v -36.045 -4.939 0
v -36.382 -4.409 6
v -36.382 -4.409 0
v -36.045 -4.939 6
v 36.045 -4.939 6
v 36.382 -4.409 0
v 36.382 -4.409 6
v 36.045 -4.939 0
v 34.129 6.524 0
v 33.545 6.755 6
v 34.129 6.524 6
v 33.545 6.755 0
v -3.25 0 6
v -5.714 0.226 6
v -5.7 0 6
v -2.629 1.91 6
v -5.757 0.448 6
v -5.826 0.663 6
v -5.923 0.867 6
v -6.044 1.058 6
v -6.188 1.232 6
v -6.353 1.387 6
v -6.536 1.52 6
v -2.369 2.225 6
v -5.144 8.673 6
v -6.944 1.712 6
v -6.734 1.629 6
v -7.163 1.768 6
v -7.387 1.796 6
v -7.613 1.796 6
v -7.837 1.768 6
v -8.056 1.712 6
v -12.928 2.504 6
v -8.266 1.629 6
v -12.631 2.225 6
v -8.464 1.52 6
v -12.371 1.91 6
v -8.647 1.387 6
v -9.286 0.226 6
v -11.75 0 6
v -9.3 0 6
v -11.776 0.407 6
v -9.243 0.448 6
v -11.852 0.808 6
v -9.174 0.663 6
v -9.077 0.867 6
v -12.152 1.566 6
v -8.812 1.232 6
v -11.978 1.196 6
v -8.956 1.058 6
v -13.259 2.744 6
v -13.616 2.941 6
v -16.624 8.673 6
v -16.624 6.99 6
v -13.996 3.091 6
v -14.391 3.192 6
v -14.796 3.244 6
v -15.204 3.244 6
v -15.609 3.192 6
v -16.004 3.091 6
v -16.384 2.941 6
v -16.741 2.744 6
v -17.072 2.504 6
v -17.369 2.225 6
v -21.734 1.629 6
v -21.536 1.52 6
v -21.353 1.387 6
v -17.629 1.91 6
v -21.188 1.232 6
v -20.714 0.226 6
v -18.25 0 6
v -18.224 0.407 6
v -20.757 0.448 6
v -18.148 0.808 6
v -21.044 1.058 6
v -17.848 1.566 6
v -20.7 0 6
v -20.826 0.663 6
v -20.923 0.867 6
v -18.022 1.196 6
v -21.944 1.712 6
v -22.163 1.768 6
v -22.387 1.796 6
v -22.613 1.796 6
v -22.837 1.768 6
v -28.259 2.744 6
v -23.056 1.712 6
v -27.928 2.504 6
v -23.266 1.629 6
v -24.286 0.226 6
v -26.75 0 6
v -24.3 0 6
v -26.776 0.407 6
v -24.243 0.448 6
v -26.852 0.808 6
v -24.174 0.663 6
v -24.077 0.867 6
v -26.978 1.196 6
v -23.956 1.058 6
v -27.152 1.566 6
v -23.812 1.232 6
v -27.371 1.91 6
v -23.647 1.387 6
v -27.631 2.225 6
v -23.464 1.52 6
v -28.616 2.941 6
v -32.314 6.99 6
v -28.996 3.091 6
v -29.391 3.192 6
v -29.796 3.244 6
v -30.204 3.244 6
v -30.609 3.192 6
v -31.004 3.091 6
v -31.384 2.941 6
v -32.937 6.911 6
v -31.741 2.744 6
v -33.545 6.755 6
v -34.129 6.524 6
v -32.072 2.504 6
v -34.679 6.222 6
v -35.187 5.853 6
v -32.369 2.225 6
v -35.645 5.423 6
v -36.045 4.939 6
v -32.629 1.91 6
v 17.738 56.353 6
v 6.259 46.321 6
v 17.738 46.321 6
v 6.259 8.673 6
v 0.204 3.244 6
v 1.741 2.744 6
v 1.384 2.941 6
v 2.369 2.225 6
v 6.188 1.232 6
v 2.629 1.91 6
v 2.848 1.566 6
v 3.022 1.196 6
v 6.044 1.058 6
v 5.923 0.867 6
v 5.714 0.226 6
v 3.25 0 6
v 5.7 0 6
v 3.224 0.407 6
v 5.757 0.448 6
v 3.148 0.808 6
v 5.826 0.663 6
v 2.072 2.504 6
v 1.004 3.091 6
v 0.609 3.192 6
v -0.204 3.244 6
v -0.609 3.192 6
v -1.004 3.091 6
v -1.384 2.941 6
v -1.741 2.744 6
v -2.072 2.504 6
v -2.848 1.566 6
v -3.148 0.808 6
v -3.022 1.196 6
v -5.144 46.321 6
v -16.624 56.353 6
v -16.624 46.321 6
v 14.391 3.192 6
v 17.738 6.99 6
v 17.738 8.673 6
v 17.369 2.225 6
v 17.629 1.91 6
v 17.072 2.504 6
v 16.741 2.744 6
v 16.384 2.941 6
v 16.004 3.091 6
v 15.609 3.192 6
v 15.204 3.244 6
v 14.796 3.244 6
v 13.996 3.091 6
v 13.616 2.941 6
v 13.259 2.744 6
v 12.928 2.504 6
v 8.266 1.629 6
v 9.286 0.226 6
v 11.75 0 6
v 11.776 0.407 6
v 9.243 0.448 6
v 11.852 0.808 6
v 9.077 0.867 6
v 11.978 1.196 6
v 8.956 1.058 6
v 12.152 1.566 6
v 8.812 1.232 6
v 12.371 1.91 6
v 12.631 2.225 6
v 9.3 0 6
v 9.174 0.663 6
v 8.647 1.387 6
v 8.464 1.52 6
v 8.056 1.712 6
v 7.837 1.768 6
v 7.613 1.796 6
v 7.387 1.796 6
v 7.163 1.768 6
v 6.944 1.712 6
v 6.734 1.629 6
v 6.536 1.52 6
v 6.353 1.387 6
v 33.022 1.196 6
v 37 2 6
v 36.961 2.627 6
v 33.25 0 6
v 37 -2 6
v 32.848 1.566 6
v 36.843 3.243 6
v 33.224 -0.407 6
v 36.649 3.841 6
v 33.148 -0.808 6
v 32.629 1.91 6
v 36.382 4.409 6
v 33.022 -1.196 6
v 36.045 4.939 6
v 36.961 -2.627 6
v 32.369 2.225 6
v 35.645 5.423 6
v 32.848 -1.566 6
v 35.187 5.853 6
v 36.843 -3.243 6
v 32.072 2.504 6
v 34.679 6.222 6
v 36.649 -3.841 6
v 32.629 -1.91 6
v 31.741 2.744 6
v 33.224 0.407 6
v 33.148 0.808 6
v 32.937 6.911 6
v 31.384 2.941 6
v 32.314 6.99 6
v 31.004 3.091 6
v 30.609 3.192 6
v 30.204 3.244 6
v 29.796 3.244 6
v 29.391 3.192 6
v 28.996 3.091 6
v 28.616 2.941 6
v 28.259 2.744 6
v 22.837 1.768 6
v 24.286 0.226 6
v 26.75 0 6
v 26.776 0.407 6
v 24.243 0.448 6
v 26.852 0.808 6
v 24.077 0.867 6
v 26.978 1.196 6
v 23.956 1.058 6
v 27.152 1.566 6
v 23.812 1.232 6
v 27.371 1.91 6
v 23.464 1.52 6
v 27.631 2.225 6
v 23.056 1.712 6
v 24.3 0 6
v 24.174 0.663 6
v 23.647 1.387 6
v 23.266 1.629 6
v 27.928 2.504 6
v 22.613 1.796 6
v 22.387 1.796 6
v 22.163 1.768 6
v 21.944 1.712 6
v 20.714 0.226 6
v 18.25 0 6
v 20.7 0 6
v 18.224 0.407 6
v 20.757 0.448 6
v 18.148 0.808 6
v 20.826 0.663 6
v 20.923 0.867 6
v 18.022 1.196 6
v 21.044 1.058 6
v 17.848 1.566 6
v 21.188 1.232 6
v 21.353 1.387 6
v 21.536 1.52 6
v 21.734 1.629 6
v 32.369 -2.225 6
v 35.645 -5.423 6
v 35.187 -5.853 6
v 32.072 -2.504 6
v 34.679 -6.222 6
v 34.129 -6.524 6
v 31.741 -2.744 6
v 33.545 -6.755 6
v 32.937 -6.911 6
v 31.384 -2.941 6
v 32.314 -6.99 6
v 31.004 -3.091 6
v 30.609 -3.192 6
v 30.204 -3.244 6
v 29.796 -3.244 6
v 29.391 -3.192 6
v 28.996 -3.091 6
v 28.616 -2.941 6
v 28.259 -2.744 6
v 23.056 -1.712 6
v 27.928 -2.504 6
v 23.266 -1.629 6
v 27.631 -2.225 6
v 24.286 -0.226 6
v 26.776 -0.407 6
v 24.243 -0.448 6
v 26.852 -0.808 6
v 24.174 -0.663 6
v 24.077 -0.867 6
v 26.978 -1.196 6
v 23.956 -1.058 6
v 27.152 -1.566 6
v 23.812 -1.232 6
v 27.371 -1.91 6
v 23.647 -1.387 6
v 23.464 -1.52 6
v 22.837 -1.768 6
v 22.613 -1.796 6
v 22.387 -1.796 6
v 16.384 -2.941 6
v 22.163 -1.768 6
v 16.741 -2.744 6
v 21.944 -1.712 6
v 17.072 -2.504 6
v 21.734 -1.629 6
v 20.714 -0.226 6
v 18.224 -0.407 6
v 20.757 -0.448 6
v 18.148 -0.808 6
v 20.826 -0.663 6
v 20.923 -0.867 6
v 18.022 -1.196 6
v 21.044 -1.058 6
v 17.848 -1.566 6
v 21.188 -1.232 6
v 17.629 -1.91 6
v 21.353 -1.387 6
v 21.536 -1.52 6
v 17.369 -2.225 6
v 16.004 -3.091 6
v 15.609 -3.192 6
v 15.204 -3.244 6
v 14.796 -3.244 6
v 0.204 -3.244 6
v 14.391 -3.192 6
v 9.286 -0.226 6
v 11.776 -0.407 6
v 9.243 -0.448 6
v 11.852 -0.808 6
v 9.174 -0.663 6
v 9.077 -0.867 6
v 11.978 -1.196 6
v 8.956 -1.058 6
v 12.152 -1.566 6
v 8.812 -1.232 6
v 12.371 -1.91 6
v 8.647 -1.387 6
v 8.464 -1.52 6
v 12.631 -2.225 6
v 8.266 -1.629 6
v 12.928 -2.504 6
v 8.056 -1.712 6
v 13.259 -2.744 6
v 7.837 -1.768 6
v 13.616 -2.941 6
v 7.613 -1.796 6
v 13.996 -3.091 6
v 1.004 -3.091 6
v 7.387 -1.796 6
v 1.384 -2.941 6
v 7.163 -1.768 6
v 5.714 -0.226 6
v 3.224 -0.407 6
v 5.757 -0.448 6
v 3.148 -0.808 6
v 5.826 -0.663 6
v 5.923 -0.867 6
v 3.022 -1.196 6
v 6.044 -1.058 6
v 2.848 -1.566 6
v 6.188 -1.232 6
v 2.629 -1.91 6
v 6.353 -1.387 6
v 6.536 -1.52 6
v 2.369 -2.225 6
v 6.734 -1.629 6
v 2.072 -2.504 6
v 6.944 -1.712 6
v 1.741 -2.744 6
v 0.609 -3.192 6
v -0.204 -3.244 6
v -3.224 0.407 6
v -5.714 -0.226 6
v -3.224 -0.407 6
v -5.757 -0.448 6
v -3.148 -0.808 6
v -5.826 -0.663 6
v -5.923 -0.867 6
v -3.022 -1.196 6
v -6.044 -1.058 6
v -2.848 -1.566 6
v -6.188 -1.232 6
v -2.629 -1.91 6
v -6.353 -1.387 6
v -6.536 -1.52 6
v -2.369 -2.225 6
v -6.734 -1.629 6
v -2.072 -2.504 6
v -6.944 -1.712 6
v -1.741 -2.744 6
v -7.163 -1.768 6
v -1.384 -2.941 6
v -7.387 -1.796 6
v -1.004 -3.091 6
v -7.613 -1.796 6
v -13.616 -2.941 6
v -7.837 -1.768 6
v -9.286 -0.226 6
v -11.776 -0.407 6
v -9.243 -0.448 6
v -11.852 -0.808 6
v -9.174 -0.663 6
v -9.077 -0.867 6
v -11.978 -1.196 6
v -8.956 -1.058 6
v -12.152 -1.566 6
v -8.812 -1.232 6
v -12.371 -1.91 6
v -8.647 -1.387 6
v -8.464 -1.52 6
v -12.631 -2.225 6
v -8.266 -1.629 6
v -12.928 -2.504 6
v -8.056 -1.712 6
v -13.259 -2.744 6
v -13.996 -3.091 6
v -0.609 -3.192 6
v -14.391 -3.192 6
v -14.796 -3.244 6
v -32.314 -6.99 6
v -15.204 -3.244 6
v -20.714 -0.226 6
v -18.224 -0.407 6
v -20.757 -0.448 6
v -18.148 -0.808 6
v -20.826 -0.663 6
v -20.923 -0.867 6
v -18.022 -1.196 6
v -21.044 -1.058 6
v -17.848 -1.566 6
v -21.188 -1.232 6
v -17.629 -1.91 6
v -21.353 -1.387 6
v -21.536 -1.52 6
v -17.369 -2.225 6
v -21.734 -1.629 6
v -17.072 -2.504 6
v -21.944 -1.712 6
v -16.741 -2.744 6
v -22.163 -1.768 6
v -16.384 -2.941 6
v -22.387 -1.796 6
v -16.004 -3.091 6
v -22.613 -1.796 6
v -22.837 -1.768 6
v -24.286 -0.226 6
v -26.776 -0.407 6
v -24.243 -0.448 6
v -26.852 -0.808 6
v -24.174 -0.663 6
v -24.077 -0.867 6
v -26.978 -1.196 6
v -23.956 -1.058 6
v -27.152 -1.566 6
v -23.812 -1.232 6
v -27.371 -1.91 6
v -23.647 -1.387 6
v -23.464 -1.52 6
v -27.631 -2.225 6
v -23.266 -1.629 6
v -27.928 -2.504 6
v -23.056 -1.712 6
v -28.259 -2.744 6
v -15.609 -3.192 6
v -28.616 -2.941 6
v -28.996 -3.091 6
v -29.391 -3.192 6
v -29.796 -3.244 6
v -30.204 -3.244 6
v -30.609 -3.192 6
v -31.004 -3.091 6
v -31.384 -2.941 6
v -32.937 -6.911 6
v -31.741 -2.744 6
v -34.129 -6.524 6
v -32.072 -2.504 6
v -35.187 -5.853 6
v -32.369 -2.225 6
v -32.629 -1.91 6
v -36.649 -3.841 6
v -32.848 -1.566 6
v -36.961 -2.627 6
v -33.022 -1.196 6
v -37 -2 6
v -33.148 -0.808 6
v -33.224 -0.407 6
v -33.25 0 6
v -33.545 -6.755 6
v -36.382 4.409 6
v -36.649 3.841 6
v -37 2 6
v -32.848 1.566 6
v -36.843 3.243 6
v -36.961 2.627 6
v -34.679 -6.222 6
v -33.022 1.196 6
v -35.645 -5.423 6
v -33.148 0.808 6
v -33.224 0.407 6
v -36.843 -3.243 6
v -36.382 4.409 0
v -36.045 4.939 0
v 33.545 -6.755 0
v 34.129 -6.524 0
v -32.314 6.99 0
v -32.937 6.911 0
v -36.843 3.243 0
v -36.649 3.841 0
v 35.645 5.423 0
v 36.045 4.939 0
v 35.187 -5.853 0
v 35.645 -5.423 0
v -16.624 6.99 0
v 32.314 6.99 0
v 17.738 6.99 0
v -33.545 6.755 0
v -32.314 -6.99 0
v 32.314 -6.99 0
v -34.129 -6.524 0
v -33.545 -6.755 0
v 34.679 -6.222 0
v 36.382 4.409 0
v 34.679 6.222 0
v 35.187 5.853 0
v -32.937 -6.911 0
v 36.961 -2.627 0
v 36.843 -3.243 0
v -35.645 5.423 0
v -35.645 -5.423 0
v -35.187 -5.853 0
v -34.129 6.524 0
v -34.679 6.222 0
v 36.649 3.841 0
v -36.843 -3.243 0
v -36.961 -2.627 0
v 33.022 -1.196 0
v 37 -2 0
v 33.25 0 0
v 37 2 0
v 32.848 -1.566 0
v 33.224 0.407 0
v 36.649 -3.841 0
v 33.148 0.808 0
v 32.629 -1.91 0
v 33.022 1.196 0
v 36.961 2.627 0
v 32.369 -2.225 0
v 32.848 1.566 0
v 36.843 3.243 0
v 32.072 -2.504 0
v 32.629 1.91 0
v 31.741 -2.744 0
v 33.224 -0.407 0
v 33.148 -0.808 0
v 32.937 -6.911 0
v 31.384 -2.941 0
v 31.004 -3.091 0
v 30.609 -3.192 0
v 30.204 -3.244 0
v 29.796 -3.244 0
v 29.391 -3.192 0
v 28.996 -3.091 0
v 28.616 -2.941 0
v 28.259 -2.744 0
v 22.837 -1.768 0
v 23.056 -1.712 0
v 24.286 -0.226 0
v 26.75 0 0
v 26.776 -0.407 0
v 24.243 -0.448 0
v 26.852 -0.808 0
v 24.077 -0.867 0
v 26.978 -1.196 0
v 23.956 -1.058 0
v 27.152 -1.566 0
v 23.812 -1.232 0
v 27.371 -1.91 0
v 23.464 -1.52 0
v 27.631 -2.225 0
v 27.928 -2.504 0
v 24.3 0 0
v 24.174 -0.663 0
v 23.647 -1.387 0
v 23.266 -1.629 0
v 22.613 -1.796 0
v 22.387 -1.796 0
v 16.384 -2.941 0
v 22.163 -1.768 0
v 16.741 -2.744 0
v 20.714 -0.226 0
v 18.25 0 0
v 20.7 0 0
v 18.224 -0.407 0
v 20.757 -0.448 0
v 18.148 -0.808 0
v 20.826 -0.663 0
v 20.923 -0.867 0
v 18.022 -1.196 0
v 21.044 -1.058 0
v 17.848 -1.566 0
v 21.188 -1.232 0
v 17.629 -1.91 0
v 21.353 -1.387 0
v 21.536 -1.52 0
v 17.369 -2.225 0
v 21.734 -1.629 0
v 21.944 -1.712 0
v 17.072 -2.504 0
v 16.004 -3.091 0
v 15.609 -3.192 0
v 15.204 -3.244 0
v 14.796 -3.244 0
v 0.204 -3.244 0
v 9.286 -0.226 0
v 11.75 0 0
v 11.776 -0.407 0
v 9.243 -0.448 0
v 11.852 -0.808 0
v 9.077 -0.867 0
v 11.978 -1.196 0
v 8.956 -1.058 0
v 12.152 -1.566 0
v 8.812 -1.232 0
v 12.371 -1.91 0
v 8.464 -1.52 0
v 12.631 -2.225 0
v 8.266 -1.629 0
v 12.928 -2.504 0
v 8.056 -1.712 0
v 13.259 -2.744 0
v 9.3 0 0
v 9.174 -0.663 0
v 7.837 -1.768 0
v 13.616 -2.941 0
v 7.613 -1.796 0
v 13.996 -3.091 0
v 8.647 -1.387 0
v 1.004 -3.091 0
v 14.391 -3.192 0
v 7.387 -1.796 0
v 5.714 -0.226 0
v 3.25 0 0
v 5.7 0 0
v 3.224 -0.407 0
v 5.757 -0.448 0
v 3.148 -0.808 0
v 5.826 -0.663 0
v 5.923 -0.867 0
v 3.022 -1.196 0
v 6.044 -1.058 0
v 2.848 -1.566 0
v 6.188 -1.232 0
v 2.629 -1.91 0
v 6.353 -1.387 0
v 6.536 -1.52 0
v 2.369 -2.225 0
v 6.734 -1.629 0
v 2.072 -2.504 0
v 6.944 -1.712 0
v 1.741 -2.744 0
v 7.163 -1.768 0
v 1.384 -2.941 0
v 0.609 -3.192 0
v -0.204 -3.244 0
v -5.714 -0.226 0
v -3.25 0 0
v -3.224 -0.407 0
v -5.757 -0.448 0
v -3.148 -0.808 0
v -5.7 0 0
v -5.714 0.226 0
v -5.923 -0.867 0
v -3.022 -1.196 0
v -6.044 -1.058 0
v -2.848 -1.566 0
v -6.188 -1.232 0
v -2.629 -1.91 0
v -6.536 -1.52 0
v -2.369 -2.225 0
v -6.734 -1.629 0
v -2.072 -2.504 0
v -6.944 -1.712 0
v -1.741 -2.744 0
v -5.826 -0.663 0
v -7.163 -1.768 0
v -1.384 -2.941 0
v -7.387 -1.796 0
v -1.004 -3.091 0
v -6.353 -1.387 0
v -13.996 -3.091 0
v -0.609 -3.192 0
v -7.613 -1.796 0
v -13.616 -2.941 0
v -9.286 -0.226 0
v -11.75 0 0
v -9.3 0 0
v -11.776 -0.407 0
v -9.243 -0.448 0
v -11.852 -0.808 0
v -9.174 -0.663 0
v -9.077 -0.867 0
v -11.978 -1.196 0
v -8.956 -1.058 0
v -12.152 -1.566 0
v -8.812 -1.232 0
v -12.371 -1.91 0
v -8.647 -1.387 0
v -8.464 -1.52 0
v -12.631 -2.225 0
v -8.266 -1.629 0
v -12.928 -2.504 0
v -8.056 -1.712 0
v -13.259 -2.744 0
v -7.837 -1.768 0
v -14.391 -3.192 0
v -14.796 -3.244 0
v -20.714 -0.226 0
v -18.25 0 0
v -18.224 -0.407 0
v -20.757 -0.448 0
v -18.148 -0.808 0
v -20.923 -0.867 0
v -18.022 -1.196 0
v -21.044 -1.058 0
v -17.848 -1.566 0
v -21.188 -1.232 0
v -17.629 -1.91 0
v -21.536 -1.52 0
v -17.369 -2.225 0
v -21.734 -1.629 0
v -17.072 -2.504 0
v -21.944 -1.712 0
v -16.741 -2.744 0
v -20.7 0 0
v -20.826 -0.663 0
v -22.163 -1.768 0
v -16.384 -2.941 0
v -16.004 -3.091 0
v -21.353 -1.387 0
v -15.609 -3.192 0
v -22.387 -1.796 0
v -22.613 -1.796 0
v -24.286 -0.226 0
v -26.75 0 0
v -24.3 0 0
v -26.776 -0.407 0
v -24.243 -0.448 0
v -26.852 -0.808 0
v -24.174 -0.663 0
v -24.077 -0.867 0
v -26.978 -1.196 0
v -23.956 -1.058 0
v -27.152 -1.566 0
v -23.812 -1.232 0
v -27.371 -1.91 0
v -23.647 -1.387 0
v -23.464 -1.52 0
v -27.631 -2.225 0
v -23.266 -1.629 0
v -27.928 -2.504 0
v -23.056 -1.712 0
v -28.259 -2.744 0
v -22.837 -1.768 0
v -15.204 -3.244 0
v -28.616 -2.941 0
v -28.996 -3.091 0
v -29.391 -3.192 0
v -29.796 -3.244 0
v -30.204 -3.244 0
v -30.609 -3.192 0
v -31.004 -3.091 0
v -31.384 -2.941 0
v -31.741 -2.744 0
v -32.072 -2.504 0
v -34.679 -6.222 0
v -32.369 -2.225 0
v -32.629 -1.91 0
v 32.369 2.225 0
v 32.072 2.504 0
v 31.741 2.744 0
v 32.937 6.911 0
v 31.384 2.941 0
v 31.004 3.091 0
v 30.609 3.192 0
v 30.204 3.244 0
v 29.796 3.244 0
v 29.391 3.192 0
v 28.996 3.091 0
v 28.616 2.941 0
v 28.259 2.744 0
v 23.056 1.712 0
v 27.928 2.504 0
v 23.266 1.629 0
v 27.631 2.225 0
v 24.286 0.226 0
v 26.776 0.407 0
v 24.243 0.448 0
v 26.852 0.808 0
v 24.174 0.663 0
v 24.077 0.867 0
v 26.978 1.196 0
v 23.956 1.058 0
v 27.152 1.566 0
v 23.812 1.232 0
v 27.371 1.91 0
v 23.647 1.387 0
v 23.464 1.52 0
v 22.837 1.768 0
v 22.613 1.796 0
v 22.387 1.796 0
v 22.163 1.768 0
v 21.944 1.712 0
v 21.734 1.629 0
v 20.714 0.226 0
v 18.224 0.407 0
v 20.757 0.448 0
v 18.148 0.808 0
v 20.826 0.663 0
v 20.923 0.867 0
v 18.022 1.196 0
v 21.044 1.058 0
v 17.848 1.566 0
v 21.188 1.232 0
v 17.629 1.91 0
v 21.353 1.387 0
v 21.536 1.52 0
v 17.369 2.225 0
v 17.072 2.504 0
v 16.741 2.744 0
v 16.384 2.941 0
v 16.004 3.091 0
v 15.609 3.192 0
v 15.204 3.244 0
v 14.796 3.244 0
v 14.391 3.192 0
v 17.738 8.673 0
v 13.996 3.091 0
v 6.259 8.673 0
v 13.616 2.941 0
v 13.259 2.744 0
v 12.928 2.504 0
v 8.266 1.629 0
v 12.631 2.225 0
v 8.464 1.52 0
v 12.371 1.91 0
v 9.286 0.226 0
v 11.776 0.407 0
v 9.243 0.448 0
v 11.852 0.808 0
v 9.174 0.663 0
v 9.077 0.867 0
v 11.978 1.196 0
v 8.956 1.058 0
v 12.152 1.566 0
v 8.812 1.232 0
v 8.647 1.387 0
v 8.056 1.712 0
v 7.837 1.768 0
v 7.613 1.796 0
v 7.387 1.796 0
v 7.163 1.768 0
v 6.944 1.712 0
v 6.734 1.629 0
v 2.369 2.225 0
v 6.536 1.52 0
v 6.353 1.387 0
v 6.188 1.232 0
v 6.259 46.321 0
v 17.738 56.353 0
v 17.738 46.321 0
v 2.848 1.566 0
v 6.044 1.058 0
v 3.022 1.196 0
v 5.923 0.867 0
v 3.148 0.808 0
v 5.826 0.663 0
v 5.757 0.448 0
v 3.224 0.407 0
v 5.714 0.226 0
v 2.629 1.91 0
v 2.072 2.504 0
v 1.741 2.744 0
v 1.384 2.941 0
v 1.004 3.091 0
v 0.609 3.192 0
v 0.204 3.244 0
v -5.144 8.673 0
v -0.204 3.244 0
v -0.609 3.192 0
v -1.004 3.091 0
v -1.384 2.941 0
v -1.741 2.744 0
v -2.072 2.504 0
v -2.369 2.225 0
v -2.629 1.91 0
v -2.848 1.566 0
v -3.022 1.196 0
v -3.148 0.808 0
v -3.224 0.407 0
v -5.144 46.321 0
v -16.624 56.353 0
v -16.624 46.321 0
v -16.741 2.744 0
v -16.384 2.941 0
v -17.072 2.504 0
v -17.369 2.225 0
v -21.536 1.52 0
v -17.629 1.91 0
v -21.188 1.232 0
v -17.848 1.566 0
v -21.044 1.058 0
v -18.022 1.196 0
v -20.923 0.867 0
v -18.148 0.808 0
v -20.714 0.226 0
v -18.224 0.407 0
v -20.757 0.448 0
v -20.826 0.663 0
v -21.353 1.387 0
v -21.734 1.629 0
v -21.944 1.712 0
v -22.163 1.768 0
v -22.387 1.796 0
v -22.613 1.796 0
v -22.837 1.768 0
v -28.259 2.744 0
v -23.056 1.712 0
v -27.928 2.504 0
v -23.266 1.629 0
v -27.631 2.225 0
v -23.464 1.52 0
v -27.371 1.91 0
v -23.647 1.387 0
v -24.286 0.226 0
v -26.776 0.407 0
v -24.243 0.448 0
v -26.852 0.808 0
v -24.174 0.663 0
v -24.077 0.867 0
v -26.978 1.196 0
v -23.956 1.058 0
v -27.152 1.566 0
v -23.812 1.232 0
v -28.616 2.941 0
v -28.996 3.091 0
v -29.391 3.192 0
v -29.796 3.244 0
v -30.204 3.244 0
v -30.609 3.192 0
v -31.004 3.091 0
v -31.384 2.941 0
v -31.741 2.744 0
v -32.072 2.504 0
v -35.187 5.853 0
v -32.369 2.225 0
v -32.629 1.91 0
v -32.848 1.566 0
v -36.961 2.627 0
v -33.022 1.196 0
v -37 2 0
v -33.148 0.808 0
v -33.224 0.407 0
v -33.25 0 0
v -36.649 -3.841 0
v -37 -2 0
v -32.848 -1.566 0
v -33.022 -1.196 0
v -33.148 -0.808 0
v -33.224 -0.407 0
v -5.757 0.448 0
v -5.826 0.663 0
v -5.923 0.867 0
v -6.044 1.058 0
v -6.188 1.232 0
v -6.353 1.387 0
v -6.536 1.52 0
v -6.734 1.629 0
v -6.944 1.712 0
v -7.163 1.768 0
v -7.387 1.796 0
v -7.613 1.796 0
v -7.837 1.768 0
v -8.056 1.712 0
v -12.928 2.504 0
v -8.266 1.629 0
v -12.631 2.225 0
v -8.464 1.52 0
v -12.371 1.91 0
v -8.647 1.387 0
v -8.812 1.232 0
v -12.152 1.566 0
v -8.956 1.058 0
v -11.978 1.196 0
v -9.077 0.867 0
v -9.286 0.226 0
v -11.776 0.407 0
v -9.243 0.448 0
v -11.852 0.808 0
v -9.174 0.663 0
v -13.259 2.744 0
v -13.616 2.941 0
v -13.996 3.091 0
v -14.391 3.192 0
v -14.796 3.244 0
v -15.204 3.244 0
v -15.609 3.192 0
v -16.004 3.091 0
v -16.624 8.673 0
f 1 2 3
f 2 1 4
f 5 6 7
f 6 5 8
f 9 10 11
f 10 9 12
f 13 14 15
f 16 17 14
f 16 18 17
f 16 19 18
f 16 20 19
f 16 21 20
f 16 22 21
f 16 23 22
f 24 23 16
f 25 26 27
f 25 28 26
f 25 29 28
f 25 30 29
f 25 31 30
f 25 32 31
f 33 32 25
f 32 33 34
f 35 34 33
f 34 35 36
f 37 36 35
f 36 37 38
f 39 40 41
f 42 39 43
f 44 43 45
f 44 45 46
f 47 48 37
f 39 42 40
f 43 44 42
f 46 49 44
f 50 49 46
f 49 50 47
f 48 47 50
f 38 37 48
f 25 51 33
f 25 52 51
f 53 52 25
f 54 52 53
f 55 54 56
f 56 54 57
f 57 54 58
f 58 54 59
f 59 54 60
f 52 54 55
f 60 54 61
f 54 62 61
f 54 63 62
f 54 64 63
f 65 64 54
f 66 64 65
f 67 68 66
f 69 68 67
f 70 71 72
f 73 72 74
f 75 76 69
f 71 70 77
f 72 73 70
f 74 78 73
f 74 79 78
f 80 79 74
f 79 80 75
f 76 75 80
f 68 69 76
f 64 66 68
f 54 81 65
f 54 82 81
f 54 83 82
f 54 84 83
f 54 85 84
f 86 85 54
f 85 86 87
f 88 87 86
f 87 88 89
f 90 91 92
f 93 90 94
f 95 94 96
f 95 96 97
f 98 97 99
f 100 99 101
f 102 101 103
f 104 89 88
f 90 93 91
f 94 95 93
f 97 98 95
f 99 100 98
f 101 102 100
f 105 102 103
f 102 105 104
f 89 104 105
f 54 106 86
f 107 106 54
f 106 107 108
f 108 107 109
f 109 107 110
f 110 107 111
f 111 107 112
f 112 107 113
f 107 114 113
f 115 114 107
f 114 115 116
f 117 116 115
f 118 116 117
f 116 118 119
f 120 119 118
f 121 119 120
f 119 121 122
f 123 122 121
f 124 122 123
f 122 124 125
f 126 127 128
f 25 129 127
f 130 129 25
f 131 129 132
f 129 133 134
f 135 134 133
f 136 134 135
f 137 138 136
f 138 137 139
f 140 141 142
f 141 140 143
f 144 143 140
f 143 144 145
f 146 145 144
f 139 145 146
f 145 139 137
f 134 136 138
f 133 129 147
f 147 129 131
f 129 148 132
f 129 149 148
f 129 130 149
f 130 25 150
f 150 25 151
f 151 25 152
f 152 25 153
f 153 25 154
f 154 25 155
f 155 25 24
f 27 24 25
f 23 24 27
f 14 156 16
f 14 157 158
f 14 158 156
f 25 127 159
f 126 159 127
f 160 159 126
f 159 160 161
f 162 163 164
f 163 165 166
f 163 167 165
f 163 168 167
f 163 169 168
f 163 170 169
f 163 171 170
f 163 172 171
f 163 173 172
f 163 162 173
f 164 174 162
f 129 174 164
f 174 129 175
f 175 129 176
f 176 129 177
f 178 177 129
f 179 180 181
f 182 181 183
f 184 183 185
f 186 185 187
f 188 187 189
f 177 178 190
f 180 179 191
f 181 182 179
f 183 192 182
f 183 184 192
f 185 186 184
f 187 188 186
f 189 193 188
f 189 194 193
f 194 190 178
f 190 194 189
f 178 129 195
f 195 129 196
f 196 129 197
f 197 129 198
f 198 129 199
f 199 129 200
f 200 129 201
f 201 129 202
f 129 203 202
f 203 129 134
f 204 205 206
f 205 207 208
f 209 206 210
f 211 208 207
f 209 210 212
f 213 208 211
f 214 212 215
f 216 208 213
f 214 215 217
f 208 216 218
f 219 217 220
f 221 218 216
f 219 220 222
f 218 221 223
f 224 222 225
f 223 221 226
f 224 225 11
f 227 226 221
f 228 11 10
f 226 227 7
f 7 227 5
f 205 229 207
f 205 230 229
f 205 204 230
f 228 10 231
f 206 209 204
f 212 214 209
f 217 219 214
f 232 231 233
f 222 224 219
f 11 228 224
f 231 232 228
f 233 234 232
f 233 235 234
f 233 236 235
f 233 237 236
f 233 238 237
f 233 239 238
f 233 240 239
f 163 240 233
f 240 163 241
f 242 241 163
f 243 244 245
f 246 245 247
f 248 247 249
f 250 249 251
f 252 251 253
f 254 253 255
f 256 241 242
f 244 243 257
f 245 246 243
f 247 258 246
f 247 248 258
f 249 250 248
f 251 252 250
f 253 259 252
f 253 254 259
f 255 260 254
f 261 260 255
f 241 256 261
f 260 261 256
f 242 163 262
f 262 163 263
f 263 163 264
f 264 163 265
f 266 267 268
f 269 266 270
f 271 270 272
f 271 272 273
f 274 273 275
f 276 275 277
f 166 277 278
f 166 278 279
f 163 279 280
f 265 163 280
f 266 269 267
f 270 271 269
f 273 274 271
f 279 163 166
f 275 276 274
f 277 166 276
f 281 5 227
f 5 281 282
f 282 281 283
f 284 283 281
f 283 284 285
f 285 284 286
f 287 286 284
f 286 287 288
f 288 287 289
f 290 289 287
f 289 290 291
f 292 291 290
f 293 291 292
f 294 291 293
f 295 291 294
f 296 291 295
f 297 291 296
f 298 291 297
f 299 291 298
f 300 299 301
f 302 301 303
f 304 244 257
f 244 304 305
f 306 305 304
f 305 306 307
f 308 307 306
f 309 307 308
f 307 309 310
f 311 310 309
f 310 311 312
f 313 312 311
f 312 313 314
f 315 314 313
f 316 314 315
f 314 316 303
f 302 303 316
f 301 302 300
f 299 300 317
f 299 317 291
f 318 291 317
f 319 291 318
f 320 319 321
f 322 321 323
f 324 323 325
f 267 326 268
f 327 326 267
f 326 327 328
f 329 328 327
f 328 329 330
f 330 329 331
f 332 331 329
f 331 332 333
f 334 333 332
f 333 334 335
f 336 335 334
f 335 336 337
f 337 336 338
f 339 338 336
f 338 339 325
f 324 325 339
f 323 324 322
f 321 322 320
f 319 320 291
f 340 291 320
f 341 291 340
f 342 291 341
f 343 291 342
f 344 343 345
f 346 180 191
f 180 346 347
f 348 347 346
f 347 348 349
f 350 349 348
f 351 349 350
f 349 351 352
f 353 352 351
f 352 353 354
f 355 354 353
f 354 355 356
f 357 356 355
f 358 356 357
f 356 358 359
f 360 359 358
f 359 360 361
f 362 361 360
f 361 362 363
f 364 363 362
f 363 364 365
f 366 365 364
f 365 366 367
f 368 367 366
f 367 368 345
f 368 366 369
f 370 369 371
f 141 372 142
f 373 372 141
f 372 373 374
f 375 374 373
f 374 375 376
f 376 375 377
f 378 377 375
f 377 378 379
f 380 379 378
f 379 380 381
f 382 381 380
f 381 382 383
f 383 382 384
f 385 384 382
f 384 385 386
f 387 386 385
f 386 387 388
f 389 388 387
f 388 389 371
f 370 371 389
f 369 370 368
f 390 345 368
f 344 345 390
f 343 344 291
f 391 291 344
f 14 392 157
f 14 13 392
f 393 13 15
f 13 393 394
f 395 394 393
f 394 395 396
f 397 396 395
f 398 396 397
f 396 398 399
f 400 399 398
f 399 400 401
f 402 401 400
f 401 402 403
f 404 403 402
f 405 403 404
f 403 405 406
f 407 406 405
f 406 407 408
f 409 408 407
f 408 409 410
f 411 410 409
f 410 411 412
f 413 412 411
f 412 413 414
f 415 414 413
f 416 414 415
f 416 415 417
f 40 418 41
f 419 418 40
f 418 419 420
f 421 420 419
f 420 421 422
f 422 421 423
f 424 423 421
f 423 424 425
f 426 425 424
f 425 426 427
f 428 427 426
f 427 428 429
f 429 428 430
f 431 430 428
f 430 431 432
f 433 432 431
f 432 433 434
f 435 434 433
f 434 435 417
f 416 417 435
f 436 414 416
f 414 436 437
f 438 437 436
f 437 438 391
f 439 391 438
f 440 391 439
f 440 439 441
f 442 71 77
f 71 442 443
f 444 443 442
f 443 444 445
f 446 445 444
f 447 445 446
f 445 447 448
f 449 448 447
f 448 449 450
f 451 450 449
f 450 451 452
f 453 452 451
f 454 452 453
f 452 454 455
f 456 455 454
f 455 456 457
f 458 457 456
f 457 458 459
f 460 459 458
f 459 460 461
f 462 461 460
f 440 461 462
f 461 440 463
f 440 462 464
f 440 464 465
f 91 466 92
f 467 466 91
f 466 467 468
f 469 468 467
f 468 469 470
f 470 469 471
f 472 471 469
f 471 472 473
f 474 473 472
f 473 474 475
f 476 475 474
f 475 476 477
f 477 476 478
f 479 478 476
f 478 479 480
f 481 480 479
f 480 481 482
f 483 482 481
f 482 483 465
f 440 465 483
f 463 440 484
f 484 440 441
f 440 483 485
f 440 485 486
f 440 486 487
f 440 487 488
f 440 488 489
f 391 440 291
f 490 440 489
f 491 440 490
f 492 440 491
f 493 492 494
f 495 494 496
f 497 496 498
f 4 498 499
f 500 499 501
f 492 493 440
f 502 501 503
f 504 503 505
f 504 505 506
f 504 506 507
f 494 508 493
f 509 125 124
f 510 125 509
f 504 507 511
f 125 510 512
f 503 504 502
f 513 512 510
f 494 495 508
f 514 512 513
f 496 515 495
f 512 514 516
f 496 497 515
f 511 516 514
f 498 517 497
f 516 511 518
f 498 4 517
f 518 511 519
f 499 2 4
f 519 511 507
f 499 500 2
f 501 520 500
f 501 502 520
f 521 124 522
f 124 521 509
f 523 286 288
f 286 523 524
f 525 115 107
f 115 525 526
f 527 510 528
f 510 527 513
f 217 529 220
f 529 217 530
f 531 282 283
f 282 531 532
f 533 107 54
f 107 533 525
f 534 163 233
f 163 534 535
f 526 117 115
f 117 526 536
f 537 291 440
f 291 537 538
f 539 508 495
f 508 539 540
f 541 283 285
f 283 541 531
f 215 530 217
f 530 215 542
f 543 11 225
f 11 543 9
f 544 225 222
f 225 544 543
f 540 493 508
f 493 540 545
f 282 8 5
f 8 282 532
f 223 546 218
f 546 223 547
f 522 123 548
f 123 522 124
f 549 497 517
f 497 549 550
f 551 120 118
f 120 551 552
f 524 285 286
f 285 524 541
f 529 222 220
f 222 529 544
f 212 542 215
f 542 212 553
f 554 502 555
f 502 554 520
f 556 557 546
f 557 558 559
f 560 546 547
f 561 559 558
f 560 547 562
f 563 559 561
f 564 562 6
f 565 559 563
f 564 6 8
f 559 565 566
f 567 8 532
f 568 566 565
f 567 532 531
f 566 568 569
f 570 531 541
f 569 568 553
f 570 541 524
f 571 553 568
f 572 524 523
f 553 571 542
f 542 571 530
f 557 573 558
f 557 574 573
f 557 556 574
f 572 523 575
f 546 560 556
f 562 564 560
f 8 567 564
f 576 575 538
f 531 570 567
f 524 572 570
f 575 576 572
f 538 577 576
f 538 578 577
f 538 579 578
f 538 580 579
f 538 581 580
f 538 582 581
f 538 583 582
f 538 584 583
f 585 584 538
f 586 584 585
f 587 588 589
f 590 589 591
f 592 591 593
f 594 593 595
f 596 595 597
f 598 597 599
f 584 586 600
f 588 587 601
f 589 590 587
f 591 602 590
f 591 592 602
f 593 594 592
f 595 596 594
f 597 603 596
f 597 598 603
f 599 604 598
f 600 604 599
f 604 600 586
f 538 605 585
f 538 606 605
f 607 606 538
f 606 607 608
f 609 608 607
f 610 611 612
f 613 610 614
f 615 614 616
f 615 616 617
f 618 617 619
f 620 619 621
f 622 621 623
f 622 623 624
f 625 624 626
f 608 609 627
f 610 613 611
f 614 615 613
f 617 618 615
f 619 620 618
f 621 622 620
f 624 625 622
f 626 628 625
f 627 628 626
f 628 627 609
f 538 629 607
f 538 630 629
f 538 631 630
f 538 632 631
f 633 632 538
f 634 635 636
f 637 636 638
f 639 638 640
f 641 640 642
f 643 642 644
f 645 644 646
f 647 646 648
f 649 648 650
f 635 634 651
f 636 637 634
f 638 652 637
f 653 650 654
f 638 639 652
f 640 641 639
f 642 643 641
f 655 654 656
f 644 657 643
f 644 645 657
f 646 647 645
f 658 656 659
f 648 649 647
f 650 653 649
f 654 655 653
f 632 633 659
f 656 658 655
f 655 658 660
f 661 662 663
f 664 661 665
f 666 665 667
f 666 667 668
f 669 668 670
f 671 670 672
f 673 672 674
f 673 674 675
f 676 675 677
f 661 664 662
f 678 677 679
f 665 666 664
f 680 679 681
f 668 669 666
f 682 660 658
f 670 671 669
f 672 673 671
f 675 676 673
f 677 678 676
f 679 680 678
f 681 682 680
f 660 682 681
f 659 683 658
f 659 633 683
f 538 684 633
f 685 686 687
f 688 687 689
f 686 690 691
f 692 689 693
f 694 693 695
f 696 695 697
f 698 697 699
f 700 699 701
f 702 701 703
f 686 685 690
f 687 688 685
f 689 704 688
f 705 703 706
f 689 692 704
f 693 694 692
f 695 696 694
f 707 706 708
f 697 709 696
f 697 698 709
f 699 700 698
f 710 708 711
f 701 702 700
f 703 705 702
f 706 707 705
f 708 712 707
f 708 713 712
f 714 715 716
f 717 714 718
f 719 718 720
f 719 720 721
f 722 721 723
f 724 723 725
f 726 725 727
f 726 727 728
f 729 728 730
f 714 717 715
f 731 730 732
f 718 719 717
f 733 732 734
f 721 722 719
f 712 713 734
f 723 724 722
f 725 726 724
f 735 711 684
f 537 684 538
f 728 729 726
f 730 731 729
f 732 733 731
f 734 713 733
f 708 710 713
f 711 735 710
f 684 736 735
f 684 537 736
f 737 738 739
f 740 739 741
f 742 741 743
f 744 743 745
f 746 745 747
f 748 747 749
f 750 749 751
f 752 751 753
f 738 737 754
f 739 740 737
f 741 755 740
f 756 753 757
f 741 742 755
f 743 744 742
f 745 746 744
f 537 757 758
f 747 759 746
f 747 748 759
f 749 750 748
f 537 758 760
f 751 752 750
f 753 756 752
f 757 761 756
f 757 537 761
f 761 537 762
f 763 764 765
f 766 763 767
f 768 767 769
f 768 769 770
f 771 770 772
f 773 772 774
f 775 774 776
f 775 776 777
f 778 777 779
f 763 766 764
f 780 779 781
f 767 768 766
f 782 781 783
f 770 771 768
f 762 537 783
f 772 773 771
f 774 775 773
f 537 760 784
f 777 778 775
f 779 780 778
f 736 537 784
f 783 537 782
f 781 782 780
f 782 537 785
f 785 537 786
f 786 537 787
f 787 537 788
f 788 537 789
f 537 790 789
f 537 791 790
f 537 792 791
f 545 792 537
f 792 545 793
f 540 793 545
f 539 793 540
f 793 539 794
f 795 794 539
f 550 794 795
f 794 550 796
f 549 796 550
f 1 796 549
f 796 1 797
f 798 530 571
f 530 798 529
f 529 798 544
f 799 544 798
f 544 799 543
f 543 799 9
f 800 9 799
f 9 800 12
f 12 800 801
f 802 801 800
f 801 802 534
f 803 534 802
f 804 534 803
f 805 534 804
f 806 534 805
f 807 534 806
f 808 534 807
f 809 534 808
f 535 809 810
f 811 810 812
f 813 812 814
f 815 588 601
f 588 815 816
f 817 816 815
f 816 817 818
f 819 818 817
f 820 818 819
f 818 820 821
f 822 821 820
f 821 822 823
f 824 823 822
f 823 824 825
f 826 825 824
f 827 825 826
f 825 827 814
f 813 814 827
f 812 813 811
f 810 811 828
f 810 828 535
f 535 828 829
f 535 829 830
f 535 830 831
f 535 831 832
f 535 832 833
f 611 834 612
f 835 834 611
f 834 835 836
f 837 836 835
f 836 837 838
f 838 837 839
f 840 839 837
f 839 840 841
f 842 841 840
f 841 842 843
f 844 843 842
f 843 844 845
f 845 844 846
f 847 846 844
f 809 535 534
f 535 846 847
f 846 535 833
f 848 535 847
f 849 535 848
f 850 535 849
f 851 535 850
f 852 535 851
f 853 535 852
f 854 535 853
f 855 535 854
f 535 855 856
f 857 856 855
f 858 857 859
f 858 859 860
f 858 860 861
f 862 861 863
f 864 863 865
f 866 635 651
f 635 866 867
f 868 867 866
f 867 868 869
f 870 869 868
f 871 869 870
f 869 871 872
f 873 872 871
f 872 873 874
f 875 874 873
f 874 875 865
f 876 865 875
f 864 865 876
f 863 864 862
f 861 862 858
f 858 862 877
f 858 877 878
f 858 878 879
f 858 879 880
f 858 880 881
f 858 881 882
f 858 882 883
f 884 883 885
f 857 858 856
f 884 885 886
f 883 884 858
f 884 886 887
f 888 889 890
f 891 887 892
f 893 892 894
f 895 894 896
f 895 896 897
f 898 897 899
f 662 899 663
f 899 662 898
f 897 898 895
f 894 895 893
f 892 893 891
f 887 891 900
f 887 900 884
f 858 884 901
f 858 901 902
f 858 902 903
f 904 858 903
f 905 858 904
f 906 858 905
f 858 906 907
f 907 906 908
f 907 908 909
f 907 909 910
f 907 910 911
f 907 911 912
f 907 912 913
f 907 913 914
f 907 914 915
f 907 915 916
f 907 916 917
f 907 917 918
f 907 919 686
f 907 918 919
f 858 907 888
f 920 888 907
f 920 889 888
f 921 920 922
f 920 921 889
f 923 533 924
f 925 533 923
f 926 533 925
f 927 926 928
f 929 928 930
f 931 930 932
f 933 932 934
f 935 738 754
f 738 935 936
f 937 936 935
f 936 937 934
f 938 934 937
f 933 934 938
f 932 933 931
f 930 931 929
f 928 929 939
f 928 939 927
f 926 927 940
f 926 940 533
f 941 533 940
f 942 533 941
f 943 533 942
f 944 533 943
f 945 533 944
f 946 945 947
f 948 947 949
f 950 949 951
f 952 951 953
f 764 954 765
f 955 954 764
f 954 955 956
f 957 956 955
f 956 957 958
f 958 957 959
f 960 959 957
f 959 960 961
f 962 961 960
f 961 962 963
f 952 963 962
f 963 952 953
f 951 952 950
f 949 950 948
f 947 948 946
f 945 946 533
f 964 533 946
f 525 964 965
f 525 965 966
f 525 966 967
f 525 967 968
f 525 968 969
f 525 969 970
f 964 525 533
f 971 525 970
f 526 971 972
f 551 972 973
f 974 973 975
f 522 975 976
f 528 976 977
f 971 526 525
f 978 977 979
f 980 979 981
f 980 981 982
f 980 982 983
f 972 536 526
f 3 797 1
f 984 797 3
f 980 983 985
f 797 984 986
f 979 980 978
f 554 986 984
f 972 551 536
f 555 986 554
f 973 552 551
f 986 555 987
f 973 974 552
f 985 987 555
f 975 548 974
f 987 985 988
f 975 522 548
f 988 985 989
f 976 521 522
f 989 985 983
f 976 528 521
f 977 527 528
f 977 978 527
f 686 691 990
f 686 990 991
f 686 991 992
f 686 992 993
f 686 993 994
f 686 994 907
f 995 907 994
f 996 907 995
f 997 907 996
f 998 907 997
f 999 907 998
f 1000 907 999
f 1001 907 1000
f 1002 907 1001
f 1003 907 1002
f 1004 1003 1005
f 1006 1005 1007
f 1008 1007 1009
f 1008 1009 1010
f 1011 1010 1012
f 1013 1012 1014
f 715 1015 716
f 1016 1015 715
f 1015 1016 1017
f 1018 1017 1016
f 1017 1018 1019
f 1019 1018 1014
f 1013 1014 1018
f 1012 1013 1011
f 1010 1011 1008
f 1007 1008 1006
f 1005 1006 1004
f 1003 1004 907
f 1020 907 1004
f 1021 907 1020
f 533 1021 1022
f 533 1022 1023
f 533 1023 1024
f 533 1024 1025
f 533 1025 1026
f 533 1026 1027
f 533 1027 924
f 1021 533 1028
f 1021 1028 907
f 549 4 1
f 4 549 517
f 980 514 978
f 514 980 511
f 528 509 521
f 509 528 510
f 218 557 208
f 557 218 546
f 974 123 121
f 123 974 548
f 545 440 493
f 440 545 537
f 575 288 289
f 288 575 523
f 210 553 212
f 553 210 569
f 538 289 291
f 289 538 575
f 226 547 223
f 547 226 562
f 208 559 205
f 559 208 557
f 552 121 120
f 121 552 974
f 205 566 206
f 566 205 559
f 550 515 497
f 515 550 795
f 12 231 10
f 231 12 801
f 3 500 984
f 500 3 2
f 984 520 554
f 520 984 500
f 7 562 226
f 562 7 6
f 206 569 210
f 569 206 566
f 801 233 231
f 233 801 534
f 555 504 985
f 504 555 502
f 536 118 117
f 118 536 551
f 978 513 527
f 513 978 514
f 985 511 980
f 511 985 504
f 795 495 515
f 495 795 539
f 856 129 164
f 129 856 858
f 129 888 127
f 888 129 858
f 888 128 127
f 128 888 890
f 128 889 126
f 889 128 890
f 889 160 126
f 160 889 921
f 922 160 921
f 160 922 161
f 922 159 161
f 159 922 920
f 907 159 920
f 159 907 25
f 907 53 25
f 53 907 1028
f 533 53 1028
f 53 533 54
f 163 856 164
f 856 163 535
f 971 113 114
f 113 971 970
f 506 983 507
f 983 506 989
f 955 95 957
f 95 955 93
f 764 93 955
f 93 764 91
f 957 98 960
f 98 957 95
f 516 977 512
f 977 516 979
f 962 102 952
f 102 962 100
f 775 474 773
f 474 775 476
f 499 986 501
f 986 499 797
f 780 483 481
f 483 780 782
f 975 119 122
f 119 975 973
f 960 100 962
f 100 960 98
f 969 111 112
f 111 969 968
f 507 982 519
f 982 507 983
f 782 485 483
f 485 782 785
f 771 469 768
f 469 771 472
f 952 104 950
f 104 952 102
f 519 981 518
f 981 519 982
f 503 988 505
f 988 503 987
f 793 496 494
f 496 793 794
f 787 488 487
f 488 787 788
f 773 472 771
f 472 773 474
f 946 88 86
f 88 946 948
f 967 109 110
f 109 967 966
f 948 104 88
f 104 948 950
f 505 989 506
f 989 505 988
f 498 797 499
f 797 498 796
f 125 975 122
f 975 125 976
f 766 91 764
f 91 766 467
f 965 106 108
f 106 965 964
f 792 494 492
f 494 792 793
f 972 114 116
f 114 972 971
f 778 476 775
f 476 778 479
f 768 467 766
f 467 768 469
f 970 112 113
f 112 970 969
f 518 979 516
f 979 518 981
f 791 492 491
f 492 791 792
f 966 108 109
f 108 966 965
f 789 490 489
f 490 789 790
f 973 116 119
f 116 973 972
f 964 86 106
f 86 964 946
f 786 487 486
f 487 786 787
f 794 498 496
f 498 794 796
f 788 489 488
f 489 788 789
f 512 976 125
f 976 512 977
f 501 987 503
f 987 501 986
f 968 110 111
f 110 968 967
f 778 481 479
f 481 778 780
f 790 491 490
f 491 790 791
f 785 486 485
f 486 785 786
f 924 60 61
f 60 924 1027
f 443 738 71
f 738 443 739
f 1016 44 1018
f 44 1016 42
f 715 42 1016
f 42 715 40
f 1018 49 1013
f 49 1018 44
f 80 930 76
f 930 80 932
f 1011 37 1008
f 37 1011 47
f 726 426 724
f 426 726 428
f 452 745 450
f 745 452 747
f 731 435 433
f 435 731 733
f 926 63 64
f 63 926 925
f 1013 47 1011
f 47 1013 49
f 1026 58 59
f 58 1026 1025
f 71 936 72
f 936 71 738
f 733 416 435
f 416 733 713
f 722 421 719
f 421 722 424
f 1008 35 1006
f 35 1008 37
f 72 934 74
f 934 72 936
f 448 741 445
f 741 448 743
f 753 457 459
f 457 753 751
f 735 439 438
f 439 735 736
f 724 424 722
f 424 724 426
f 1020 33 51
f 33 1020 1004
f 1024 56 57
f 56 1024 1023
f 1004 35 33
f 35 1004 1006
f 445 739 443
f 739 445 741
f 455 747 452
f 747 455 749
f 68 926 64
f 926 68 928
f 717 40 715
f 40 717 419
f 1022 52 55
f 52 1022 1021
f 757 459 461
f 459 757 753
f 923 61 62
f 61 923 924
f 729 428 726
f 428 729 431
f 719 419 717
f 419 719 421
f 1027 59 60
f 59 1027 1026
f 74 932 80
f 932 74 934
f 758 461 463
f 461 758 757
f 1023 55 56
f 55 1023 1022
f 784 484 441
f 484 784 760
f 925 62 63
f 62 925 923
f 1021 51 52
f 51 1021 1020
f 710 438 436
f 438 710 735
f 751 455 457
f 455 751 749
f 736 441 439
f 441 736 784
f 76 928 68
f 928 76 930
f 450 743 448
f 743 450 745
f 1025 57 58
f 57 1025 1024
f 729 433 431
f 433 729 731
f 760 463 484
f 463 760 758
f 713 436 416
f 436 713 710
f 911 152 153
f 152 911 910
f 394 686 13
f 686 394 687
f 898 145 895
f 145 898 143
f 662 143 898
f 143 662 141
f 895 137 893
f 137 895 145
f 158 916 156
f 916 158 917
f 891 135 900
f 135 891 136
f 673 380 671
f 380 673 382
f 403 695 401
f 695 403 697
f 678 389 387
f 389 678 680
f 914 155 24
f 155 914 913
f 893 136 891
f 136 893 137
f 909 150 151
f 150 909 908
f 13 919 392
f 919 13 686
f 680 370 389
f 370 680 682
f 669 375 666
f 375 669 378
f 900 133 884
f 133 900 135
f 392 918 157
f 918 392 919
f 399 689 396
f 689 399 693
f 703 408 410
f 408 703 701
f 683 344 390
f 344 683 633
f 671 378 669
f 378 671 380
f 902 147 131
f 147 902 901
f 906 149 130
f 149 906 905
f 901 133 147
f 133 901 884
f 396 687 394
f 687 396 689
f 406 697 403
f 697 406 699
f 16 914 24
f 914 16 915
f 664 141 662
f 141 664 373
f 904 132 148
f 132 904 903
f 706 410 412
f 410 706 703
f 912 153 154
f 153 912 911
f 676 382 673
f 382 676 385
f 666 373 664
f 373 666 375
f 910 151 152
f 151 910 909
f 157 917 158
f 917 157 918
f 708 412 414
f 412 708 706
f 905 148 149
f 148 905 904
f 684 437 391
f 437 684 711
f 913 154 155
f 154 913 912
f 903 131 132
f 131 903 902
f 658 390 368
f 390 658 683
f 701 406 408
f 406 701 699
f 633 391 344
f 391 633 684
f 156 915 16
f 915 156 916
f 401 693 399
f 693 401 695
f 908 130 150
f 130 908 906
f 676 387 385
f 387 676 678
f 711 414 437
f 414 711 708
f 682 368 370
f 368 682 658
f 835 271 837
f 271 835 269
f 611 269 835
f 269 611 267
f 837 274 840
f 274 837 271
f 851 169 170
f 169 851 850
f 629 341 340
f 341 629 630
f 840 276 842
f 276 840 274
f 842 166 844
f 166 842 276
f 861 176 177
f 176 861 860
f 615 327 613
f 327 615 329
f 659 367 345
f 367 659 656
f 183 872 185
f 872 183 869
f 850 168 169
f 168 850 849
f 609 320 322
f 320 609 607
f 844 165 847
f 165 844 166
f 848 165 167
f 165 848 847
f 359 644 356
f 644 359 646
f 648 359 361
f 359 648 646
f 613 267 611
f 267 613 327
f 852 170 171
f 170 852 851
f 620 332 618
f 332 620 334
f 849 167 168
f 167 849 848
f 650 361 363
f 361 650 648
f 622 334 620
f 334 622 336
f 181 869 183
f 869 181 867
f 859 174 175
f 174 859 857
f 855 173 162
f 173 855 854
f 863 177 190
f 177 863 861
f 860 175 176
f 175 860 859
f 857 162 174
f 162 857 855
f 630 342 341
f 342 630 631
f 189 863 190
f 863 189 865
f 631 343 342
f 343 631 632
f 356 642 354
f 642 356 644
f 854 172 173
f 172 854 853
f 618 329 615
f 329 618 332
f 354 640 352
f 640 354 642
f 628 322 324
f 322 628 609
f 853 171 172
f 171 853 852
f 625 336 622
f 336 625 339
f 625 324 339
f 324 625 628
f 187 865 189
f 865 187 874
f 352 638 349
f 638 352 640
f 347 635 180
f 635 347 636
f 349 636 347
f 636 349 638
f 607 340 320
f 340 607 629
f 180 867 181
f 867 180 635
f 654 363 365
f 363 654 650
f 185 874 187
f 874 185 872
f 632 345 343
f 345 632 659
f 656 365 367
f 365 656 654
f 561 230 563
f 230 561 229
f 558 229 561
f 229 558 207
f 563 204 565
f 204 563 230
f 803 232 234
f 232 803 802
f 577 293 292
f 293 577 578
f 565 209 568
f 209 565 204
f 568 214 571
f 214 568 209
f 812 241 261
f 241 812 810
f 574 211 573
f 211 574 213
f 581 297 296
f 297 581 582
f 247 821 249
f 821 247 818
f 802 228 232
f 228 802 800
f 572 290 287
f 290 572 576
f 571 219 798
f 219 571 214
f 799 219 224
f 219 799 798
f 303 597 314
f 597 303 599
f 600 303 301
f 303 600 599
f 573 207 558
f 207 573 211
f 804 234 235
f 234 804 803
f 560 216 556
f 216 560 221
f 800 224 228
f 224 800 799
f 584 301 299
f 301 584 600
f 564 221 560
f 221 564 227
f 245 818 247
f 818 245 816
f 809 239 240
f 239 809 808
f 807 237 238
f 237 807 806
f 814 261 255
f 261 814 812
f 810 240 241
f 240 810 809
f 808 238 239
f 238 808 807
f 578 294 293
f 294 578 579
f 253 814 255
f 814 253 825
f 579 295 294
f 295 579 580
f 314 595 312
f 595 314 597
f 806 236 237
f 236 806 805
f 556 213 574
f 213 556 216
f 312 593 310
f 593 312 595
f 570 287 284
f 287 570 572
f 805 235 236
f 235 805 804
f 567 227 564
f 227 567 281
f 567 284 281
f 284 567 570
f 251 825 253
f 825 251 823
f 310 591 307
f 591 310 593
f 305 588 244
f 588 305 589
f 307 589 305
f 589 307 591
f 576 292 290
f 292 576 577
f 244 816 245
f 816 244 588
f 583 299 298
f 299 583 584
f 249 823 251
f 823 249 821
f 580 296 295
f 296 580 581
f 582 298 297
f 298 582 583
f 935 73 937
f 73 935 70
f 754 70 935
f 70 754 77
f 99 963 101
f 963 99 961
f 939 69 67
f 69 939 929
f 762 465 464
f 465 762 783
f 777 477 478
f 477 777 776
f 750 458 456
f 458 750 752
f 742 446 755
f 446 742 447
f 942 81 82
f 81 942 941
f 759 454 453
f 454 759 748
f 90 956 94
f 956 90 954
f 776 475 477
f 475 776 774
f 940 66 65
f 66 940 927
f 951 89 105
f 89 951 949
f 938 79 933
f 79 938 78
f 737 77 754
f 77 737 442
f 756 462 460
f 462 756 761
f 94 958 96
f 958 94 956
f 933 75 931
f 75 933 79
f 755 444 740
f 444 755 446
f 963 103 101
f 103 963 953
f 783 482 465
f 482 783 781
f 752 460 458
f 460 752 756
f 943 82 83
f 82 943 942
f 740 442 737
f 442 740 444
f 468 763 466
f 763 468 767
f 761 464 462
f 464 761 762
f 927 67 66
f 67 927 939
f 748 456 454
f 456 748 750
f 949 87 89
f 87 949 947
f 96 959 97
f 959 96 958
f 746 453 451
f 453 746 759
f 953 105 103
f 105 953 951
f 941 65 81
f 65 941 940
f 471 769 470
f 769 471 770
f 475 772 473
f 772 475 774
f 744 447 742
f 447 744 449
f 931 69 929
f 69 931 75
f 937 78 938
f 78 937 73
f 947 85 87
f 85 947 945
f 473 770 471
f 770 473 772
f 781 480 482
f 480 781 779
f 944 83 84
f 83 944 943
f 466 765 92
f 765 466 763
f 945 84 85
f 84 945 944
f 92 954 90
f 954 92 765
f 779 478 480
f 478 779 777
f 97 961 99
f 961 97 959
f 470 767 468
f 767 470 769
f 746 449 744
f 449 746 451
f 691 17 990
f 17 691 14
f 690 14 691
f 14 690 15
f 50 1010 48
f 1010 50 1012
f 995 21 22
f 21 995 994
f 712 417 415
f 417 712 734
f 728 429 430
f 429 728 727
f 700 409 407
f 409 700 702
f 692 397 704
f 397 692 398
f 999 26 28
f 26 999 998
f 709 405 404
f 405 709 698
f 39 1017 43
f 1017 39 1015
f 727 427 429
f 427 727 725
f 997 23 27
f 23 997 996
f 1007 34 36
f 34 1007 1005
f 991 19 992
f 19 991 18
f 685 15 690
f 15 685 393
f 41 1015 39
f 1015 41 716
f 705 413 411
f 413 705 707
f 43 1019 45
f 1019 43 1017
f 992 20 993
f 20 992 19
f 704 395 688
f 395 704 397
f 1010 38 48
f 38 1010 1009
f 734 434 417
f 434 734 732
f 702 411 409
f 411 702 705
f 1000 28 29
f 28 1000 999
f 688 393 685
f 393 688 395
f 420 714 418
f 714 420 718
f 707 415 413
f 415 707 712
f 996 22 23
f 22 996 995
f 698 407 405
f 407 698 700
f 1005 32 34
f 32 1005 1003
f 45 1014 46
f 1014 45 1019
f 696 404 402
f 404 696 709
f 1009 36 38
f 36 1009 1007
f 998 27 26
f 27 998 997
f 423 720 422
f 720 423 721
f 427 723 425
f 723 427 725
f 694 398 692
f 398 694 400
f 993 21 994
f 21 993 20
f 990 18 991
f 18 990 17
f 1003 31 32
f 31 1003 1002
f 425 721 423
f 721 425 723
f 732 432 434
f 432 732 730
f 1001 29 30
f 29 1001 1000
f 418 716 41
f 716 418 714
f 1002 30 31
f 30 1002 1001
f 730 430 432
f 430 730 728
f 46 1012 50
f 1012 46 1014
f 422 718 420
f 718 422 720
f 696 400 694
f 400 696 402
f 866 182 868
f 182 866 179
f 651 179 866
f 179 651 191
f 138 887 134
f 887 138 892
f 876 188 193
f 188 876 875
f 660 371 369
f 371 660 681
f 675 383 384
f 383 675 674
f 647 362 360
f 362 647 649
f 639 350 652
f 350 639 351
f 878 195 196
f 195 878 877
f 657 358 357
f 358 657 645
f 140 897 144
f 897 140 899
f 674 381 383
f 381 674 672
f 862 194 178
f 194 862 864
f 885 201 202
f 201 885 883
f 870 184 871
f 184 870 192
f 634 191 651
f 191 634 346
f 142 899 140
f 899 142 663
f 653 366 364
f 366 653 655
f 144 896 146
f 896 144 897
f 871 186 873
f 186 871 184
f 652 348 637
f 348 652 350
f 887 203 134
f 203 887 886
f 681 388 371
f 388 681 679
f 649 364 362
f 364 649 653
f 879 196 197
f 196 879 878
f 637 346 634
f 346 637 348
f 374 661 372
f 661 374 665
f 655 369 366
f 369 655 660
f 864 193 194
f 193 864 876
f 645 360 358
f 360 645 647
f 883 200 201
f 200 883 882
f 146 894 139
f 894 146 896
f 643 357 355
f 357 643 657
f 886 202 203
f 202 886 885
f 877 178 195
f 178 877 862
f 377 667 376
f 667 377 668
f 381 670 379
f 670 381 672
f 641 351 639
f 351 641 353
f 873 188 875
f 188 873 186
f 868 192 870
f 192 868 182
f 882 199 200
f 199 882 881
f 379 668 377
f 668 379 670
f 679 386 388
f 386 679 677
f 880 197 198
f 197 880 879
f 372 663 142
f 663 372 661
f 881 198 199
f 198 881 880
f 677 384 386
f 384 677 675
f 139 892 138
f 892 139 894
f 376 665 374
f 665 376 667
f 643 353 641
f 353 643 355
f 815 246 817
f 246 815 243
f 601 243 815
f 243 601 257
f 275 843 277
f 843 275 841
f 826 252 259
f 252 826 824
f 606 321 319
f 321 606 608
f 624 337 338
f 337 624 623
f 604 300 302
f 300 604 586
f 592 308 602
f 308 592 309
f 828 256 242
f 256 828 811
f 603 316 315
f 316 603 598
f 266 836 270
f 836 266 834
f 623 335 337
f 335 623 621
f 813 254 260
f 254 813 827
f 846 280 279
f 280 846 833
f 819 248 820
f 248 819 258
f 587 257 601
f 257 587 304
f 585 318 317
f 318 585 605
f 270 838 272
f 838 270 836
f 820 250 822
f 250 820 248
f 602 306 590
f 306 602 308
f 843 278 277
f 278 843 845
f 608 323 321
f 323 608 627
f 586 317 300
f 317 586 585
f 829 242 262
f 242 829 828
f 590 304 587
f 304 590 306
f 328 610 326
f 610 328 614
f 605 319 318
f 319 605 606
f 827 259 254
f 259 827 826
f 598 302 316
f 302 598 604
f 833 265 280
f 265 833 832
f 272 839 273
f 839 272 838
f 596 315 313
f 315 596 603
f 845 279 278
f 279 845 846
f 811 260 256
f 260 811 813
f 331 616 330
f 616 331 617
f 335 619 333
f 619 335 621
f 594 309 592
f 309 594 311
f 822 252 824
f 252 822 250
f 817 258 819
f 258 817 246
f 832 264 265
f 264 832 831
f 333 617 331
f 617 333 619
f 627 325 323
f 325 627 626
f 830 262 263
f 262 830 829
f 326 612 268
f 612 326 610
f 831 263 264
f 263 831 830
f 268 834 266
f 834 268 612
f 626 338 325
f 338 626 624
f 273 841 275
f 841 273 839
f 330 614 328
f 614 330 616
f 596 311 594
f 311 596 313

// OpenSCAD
$fn = 50;


difference() {
	union() {
		hull() {
			translate(v = [-32.0000000000, 2.0000000000, 0]) {
				cylinder(h = 6, r = 5);
			}
			translate(v = [32.0000000000, 2.0000000000, 0]) {
				cylinder(h = 6, r = 5);
			}
			translate(v = [-32.0000000000, -2.0000000000, 0]) {
				cylinder(h = 6, r = 5);
			}
			translate(v = [32.0000000000, -2.0000000000, 0]) {
				cylinder(h = 6, r = 5);
			}
		}
		translate(v = [0, 55, 0]) {
			linear_extrude(height = 6) {
				text(font = "DejaVu Sans Mono:style=Bold", halign = "center", size = 57.0000000000, text = "I", valign = "top");
			}
		}
	}
	union() {
		translate(v = [-30.0000000000, 0.0000000000, 0]) {
			translate(v = [0, 0, -100]) {
				cylinder(h = 200, r = 3.2500000000);
			}
		}
		translate(v = [-15.0000000000, 0.0000000000, 0]) {
			translate(v = [0, 0, -100]) {
				cylinder(h = 200, r = 3.2500000000);
			}
		}
		translate(v = [0, 0, -100]) {
			cylinder(h = 200, r = 3.2500000000);
		}
		translate(v = [15.0000000000, 0.0000000000, 0]) {
			translate(v = [0, 0, -100]) {
				cylinder(h = 200, r = 3.2500000000);
			}
		}
		translate(v = [30.0000000000, 0.0000000000, 0]) {
			translate(v = [0, 0, -100]) {
				cylinder(h = 200, r = 3.2500000000);
			}
		}
		translate(v = [-30.0000000000, 0.0000000000, 0]) {
			translate(v = [0, 0, -100]) {
				cylinder(h = 200, r = 1.8000000000);
			}
		}
		translate(v = [-22.5000000000, 0.0000000000, 0]) {
			translate(v = [0, 0, -100]) {
				cylinder(h = 200, r = 1.8000000000);
			}
		}
		translate(v = [-15.0000000000, 0.0000000000, 0]) {
			translate(v = [0, 0, -100]) {
				cylinder(h = 200, r = 1.8000000000);
			}
		}
		translate(v = [-7.5000000000, 0.0000000000, 0]) {
			translate(v = [0, 0, -100]) {
				cylinder(h = 200, r = 1.8000000000);
			}
		}
		translate(v = [0, 0, -100]) {
			cylinder(h = 200, r = 1.8000000000);
		}
		translate(v = [7.5000000000, 0.0000000000, 0]) {
			translate(v = [0, 0, -100]) {
				cylinder(h = 200, r = 1.8000000000);
			}
		}
		translate(v = [15.0000000000, 0.0000000000, 0]) {
			translate(v = [0, 0, -100]) {
				cylinder(h = 200, r = 1.8000000000);
			}
		}
		translate(v = [22.5000000000, 0.0000000000, 0]) {
			translate(v = [0, 0, -100]) {
				cylinder(h = 200, r = 1.8000000000);
			}
		}
		translate(v = [30.0000000000, 0.0000000000, 0]) {
			translate(v = [0, 0, -100]) {
				cylinder(h = 200, r = 1.8000000000);
			}
		}
	}
}
